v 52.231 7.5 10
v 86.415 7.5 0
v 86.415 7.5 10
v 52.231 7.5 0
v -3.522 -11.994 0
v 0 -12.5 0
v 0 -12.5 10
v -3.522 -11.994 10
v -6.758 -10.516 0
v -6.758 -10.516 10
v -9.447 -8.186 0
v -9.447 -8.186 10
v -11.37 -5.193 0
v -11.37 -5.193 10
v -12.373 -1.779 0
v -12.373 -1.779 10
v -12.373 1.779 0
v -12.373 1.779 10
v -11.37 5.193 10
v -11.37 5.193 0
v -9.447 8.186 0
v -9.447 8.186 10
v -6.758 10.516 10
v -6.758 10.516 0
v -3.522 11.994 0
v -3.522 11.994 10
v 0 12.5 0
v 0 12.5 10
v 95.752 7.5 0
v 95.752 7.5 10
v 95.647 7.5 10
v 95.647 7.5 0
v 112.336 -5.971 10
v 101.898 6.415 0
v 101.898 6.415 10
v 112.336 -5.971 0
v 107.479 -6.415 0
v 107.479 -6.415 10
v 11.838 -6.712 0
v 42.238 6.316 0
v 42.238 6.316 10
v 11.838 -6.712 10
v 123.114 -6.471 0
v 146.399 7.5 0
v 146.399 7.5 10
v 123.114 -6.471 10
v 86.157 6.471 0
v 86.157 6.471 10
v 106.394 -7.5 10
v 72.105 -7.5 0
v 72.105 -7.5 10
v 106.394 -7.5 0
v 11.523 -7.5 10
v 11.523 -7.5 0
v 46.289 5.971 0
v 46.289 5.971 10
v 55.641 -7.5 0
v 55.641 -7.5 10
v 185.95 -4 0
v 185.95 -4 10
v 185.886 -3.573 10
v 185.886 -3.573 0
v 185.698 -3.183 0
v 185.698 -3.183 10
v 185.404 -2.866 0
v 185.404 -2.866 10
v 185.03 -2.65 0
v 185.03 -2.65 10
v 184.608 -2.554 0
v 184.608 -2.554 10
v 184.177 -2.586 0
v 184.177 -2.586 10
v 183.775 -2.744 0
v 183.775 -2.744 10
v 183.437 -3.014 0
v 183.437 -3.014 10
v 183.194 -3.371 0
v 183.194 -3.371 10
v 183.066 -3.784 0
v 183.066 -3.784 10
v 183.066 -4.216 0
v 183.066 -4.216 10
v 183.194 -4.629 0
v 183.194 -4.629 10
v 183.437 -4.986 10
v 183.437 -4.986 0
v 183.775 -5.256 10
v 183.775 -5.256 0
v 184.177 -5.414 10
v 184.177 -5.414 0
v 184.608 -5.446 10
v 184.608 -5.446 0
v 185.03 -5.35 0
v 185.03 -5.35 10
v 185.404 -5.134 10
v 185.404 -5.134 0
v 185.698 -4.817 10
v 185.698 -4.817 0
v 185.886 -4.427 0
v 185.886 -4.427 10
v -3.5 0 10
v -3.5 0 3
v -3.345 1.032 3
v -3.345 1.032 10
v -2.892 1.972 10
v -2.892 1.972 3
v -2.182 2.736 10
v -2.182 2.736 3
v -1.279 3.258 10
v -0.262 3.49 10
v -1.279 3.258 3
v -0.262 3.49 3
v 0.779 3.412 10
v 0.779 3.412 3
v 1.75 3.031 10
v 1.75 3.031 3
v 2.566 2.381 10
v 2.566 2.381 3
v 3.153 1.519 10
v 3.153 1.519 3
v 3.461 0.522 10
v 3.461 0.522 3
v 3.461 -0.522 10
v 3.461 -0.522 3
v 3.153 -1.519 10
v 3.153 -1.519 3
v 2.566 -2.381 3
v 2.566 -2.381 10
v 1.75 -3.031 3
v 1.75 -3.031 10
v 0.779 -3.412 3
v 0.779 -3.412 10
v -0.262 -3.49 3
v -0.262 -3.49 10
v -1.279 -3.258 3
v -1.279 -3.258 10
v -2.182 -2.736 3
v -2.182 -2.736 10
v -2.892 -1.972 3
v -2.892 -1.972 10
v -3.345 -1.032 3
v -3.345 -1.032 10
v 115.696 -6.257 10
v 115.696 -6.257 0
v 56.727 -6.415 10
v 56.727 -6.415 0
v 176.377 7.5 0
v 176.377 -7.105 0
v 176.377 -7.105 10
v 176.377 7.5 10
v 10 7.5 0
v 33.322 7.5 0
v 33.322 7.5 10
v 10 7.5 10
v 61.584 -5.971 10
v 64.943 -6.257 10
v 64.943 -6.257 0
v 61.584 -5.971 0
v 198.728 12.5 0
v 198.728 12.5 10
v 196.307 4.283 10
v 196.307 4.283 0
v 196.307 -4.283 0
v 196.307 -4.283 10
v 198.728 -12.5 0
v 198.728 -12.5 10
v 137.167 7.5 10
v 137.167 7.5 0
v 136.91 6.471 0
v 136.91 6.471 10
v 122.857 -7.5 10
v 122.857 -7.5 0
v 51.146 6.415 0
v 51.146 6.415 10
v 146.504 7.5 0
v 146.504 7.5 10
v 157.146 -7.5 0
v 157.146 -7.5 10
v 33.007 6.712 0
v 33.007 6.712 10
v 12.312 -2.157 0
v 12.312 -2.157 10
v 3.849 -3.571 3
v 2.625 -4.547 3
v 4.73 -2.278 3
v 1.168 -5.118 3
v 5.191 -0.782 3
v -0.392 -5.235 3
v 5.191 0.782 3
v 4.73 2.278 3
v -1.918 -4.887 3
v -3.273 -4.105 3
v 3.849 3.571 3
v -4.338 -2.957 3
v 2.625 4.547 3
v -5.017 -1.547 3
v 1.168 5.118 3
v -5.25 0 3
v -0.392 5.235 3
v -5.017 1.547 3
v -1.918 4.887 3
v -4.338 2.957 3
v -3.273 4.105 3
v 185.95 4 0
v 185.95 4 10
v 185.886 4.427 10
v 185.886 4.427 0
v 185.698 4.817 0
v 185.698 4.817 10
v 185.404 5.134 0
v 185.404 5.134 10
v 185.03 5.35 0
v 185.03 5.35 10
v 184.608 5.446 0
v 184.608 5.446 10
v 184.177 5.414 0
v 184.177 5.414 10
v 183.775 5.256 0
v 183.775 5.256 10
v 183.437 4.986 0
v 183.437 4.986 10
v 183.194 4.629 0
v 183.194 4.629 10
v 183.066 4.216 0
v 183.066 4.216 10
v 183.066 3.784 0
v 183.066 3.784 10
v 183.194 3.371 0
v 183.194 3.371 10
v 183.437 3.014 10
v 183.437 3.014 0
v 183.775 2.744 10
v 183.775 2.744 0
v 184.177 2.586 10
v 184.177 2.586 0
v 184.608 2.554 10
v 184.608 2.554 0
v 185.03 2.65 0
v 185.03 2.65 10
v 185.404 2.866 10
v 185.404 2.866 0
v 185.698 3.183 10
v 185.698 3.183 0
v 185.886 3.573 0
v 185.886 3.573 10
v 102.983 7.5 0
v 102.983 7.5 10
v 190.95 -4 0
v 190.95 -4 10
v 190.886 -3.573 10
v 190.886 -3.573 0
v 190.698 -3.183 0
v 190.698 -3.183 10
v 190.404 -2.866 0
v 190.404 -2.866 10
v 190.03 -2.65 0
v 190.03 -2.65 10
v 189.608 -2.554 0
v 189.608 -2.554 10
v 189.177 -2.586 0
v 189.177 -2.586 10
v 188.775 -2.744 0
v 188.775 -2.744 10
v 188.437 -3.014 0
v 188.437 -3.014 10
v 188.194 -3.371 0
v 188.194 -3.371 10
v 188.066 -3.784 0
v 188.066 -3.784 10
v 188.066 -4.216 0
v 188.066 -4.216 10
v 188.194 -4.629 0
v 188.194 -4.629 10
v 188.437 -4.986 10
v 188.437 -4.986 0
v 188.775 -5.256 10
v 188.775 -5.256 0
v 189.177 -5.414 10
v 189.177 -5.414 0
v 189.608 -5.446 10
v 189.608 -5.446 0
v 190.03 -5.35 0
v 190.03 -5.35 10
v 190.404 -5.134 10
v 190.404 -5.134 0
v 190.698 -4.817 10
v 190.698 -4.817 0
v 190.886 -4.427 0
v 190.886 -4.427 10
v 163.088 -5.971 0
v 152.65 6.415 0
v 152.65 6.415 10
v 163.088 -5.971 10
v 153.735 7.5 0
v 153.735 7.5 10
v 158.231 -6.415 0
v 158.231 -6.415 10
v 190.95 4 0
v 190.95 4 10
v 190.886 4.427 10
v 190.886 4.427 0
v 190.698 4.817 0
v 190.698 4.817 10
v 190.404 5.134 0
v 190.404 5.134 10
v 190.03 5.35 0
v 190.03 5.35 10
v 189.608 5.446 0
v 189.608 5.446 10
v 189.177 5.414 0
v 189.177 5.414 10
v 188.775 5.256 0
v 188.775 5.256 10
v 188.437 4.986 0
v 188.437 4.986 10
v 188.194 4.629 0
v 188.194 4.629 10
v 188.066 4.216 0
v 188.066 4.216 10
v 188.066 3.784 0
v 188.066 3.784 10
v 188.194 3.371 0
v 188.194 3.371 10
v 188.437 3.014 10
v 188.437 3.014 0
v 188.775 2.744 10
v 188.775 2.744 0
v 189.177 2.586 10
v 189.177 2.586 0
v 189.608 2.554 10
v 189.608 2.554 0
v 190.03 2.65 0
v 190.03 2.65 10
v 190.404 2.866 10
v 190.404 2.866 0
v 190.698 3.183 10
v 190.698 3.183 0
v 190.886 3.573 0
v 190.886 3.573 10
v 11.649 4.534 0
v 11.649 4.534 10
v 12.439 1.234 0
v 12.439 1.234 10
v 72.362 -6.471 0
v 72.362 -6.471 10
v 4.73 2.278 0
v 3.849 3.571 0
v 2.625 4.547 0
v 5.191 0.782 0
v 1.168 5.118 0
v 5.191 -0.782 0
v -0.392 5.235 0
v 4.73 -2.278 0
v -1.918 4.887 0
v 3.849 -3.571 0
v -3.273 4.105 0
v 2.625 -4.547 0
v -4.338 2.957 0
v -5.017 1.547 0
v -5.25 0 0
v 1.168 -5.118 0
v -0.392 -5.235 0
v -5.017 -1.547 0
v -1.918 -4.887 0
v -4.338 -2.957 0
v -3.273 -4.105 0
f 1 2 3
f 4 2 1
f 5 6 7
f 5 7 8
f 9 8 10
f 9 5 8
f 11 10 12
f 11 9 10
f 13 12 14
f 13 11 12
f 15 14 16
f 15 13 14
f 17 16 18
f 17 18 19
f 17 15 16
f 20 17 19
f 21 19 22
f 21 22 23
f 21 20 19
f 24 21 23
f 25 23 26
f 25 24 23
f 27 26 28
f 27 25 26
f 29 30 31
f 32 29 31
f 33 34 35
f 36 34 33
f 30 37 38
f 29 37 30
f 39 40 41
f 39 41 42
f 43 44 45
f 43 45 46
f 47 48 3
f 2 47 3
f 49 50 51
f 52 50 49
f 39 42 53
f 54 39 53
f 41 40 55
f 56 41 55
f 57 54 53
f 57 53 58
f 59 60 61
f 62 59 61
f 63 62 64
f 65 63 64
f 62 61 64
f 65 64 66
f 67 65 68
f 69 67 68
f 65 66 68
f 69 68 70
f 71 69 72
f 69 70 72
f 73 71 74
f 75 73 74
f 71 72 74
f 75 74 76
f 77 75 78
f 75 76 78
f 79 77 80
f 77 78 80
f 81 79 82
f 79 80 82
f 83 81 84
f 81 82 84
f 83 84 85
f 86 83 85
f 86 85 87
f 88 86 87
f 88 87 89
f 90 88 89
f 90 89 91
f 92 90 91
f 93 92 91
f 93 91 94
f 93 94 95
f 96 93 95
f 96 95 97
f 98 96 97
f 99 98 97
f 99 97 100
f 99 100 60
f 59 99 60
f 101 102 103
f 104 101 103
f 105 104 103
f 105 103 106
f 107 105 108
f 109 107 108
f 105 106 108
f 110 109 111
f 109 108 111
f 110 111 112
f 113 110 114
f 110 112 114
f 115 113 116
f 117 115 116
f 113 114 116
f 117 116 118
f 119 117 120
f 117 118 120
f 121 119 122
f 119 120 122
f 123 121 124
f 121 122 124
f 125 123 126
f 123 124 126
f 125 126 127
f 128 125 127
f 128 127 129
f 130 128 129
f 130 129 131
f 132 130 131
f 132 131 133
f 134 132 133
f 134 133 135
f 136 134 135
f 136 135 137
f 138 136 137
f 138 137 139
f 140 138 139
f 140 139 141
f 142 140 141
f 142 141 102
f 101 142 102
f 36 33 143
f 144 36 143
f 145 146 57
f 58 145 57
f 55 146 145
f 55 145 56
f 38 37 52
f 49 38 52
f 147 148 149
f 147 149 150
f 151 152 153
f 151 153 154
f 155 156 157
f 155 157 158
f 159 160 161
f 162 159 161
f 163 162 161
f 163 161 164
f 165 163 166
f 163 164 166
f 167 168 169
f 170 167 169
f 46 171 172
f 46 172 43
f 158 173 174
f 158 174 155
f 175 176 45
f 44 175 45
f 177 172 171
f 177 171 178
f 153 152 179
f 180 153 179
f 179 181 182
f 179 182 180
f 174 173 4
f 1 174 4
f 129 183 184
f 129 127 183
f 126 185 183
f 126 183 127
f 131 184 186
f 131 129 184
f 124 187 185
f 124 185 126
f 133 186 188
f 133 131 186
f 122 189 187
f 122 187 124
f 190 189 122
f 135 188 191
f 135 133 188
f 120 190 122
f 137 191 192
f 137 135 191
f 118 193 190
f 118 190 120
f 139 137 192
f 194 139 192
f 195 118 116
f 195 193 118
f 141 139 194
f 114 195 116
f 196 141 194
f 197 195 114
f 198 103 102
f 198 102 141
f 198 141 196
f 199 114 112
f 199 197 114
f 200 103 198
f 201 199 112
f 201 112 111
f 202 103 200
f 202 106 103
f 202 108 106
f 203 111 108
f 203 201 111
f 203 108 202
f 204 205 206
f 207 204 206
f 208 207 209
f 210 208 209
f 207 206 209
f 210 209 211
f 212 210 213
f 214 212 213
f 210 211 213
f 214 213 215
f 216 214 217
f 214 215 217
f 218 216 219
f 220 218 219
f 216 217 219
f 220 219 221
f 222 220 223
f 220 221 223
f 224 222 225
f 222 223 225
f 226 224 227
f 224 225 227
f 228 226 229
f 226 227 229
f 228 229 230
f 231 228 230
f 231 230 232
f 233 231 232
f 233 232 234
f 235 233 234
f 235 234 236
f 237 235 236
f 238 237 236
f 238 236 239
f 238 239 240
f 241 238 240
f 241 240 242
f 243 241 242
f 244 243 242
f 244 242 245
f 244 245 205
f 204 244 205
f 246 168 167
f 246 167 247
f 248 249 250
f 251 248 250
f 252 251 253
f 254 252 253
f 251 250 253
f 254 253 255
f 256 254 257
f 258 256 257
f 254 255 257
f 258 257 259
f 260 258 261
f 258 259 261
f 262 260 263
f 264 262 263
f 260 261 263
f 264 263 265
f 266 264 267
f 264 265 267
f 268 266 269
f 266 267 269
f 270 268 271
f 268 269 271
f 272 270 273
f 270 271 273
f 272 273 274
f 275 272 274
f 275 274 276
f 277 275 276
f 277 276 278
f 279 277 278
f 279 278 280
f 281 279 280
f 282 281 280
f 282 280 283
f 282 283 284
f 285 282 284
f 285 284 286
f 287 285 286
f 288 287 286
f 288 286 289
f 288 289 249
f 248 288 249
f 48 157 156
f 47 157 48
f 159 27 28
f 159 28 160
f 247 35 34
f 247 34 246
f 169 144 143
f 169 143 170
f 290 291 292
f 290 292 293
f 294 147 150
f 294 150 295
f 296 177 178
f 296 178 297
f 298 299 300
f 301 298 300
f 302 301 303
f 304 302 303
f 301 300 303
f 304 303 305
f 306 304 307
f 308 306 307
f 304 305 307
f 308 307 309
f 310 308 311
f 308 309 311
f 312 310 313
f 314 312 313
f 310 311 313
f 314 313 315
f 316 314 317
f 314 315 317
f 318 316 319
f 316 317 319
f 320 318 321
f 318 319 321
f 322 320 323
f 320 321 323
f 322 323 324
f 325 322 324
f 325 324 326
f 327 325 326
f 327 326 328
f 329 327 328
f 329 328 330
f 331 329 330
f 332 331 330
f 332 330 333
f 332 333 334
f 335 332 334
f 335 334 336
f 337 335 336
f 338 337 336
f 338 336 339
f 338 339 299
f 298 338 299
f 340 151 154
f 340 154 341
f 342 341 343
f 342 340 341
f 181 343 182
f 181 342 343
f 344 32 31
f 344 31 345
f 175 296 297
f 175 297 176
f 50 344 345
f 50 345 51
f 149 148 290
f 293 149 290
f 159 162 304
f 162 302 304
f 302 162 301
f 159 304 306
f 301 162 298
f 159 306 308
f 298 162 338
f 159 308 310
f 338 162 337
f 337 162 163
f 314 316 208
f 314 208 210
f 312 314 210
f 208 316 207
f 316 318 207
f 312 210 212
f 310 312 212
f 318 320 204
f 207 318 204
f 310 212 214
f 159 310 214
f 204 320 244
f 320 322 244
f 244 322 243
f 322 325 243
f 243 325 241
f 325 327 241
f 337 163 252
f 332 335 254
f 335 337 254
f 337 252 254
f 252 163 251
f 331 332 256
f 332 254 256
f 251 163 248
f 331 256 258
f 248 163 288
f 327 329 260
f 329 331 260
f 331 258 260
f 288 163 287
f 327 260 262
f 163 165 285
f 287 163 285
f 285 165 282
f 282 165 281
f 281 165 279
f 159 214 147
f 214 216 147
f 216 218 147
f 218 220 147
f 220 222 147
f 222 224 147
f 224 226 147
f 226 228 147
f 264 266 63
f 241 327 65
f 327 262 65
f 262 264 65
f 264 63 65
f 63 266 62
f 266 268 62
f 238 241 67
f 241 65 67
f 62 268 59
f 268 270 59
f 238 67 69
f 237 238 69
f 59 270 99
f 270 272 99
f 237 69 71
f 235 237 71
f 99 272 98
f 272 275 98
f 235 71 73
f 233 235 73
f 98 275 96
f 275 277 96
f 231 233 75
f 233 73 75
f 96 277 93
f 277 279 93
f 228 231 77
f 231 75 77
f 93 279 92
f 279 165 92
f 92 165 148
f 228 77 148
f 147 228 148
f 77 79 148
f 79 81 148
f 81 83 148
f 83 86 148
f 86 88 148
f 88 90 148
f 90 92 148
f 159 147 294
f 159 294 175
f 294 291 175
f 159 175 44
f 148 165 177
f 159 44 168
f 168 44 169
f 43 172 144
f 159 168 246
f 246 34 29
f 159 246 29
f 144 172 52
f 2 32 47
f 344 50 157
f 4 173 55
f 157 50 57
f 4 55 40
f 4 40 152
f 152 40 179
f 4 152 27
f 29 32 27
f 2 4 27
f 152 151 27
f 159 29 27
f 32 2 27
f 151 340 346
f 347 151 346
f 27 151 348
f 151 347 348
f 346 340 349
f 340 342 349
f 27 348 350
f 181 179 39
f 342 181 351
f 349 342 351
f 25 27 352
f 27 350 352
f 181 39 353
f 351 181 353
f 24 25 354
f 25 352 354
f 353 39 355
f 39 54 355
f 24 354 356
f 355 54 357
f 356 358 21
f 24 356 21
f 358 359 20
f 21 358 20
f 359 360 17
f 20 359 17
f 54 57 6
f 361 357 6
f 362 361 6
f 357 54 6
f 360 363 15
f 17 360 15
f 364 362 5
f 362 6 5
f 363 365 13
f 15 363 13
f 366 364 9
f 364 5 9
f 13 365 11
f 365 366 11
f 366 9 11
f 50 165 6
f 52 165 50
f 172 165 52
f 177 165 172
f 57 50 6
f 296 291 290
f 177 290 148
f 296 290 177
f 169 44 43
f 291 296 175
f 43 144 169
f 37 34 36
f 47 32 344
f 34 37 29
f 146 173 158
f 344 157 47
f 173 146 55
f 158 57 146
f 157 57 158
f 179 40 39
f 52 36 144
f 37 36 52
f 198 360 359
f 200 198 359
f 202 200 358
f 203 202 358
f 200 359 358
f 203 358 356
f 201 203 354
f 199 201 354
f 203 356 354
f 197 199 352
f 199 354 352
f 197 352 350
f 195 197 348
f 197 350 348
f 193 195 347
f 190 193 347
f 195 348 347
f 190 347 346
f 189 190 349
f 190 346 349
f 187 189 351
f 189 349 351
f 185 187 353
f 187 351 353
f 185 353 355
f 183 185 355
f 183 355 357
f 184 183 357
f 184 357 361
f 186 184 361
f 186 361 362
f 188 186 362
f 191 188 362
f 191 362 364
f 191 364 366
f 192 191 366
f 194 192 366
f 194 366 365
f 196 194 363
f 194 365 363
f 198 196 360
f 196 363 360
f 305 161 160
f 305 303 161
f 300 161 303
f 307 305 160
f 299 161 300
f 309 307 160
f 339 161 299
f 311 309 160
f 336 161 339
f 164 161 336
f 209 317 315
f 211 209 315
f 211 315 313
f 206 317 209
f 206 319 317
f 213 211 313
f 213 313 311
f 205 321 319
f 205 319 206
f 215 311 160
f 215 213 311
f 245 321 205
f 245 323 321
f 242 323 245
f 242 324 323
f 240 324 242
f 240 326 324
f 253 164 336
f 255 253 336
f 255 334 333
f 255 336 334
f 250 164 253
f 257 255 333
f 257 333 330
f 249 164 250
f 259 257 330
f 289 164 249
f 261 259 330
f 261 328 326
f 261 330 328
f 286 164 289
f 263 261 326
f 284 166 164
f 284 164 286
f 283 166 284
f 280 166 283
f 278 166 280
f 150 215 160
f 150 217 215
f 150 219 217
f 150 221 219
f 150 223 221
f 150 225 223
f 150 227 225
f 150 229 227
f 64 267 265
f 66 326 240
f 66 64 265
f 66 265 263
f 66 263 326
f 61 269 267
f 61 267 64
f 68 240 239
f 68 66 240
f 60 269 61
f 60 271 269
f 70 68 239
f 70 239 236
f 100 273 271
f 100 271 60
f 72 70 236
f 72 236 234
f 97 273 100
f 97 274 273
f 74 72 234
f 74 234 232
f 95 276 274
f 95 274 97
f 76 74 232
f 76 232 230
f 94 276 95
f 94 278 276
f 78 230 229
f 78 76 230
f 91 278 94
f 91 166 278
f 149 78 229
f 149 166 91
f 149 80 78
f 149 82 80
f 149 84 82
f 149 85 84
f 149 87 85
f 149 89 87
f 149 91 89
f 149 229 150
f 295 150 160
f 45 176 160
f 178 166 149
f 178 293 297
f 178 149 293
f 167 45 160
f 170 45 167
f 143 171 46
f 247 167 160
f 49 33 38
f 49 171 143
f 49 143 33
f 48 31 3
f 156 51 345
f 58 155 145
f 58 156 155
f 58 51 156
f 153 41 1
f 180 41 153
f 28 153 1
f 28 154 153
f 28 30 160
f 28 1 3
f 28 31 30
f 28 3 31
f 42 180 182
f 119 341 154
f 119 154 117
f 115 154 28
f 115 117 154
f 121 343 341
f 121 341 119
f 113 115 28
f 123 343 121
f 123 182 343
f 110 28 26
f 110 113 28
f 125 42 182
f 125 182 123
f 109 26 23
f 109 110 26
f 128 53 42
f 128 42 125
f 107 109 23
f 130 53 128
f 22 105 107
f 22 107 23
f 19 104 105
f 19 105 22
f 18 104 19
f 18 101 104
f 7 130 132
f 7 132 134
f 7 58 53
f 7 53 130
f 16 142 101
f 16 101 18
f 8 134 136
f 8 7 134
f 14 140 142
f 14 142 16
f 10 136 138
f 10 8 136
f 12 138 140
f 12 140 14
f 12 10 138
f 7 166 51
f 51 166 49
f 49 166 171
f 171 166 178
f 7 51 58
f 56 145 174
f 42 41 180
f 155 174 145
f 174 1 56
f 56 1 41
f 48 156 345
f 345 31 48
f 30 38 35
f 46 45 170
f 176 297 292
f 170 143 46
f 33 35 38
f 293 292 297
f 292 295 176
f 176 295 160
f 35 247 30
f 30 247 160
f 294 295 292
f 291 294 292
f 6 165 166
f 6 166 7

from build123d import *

# Parameters (mm, degrees)
EXTRUDE_1_DEPTH          = 10
CUT_EXTRUDE_1_DEPTH      = 252.652538235
CUT_EXTRUDE_1_DEPTH_BACK = 252.652538235
SKETCH_7_R               = 3.5
CUT_EXTRUDE_5_DEPTH      = 252.652538235
SKETCH_8_R               = 5
CUT_EXTRUDE_6_DEPTH      = 3
SKETCH_9_R               = 3
CUT_EXTRUDE_7_DEPTH      = 252.652538235
CUT_EXTRUDE_START        = -10
SKETCH_11_R              = 27
CUT_EXTRUDE_9_DEPTH      = 10
SKETCH_12_R              = 30
CUT_EXTRUDE_10_DEPTH     = 10
SKETCH_14_R              = 1.45
CUT_EXTRUDE_12_DEPTH     = 300
CHAMFER_1_SIZE           = 16.633608268
CHAMFER_1_SIZE_2         = 2
CHAMFER_1_SIZE_3         = 1.419352868
CHAMFER_1_SIZE_4         = 1.457737974
CHAMFER_1_SIZE_5         = 2.415237377
CHAMFER_1_SIZE_6         = 1.523154621
CHAMFER_1_SIZE_7         = 3.004873211
SKETCH_15_R              = 5.25
SKETCH_15_R_2            = 3.5
CUT_EXTRUDE_13_DEPTH     = 3


with BuildPart() as part:
    # 草图1 → 凸台-拉伸1 (new body)
    with BuildSketch(Plane.XY):
        with BuildLine():
            Line((0, 12.5), (199.067804112, 12.5))
            ThreePointArc((199.067804112, 12.5), (250, 0), (199.067804112, -12.5))
            Line((199.067804112, -12.5), (0, -12.5))
            ThreePointArc((0, -12.5), (-12.5, 0), (0, 12.5))
        make_face()
    extrude(amount=EXTRUDE_1_DEPTH)

    # 草图3 → 切除-拉伸1 (cut, two sides: drawn at the far end of the back side and taken through both)
    with BuildSketch(Plane.XY.offset(10).offset(-CUT_EXTRUDE_1_DEPTH_BACK)):
        Polygon((176.376805713, 7.5), (151.73545401, 7.5), (164.376805713, -7.5), (176.376805713, -7.5), align=None)
        Polygon((159.145761472, -7.5), (146.504409769, 7.5), (146.399203355, 7.5), (121.399203355, -7.5), align=None)
        Polygon((113.624600829, -7.5), (138.624600829, 7.5), (100.983249125, 7.5), align=None)
        Polygon((70.646998471, -7.5), (108.393556588, -7.5), (95.752204884, 7.5), (95.646998471, 7.5), align=None)
        Polygon((50.231044241, 7.5), (62.872395944, -7.5), (87.872395944, 7.5), align=None)
        Polygon((10, -7.5), (57.641351703, -7.5), (45, 7.5), align=None)
        with BuildLine():
            Line((34.845635859, 7.5), (10, 7.5))
            ThreePointArc((10, 7.5), (12.156331085, 2.910947362), (12.312475569, -2.157068696))
            Line((12.312475569, -2.157068696), (34.845635859, 7.5))
        make_face()
    extrude(amount=CUT_EXTRUDE_1_DEPTH + CUT_EXTRUDE_1_DEPTH_BACK, mode=Mode.SUBTRACT)

    # 草图7 → 切除-拉伸5 (cut, through all)
    with BuildSketch(Plane(origin=(0, 0, 0), x_dir=(-1, 0, 0), z_dir=(0, 0, -1))):
        Circle(SKETCH_7_R)
    extrude(amount=-CUT_EXTRUDE_5_DEPTH, mode=Mode.SUBTRACT)

    # 草图8 → 切除-拉伸6 (cut)
    with BuildSketch(Plane(origin=(0, 0, 0), x_dir=(-1, 0, 0), z_dir=(0, 0, -1))):
        with Locations((-223, 0)):
            Circle(SKETCH_8_R)
    extrude(amount=-CUT_EXTRUDE_6_DEPTH, mode=Mode.SUBTRACT)

    # 草图9 → 切除-拉伸7 (cut, through all)
    with BuildSketch(Plane(origin=(0, 0, 0), x_dir=(-1, 0, 0), z_dir=(0, 0, -1))):
        with Locations((-223, 0)):
            Circle(SKETCH_9_R)
    extrude(amount=-CUT_EXTRUDE_7_DEPTH, mode=Mode.SUBTRACT)

    # 草图11 → 切除-拉伸9 (cut)
    with BuildSketch(Plane.XY.offset(10).offset(CUT_EXTRUDE_START)):
        with Locations((223, 0)):
            Circle(SKETCH_11_R)
    extrude(amount=CUT_EXTRUDE_9_DEPTH, mode=Mode.SUBTRACT)

    # 草图12 → 切除-拉伸10 (cut)
    with BuildSketch(Plane.XY.offset(10)):
        with Locations((226, 0)):
            Circle(SKETCH_12_R)
    extrude(amount=-CUT_EXTRUDE_10_DEPTH, mode=Mode.SUBTRACT)

    # 草图14 → 切除-拉伸12 (cut)
    with BuildSketch(Plane.XY.offset(10)):
        with Locations((184.5, 4)):
            Circle(SKETCH_14_R)
        with Locations((189.5, 4)):
            Circle(SKETCH_14_R)
        with Locations((189.5, -4)):
            Circle(SKETCH_14_R)
        with Locations((184.5, -4)):
            Circle(SKETCH_14_R)
    extrude(amount=-CUT_EXTRUDE_12_DEPTH, mode=Mode.SUBTRACT)

    # 倒角1
    # the kernel refuses this chamfer: 16.633608268, 3.004873211, 2.415237377, 2, 1.523154621, 1.457737974, 1.419352868 mm, written as the material it adds along each edge
    with BuildSketch(Plane(origin=(164.376805713, -7.5, 0), x_dir=(0.9999946519205123, -0.0032704939035876055, 0), z_dir=(0, 0, 1))) as chamfer_1_piece_1:
        Polygon((CHAMFER_1_SIZE * 0.999994651904, CHAMFER_1_SIZE * 0.00327049390353), (-CHAMFER_1_SIZE_2 * 0.646924574173, CHAMFER_1_SIZE_2 * 0.762553995026), (0, 0), align=None)
    extrude(amount=10)
    with BuildSketch(Plane(origin=(151.73545401, 7.5, 0), x_dir=(0.9996219169112968, 0.027495876610586605, 0), z_dir=(0, 0, 1))) as chamfer_1_piece_2:
        Polygon((CHAMFER_1_SIZE_2 * 0.999621916911, -CHAMFER_1_SIZE_2 * 0.0274958766106), (CHAMFER_1_SIZE_3 * 0.623158385834, -CHAMFER_1_SIZE_3 * 0.782095662754), (0, 0), align=None)
    extrude(amount=10)
    with BuildSketch(Plane(origin=(159.145761472, -7.5, 10), x_dir=(-0.9996219169112968, -0.02749587661058747, 0), z_dir=(0, 0, -1))) as chamfer_1_piece_3:
        Polygon((CHAMFER_1_SIZE_2 * 0.999621916911, CHAMFER_1_SIZE_2 * 0.0274958766106), (CHAMFER_1_SIZE_3 * 0.623158385834, CHAMFER_1_SIZE_3 * 0.782095662754), (0, 0), align=None)
    extrude(amount=10)
    with BuildSketch(Plane(origin=(121.399203355, -7.5, 10), x_dir=(0.9985473741645164, -0.05388080872768336, 0), z_dir=(0, 0, -1))) as chamfer_1_piece_4:
        Polygon((CHAMFER_1_SIZE_4 * 0.998547373967, -CHAMFER_1_SIZE_4 * 0.053880808717), (CHAMFER_1_SIZE_2 * 0.828525861946, -CHAMFER_1_SIZE_2 * 0.559950797917), (0, 0), align=None)
    extrude(amount=10)
    with BuildSketch(Plane(origin=(113.624600829, -7.5, 10), x_dir=(-0.6693179531686358, 0.7429760948820275, 0), z_dir=(0, 0, -1))) as chamfer_1_piece_5:
        Polygon((CHAMFER_1_SIZE_2 * 0.999455005814, CHAMFER_1_SIZE_2 * 0.033010473375), (-CHAMFER_1_SIZE_5 * 0.191677362679, CHAMFER_1_SIZE_5 * 0.981457991195), (0, 0), align=None)
    extrude(amount=10)
    with BuildSketch(Plane(origin=(138.624600829, 7.5, 0), x_dir=(-0.9985473741645164, 0.05388080872768389, 0), z_dir=(0, 0, 1))) as chamfer_1_piece_6:
        Polygon((CHAMFER_1_SIZE_4 * 0.998547373967, CHAMFER_1_SIZE_4 * 0.053880808717), (CHAMFER_1_SIZE_2 * 0.828525861946, CHAMFER_1_SIZE_2 * 0.559950797917), (0, 0), align=None)
    extrude(amount=10)
    with BuildSketch(Plane(origin=(100.983249125, 7.5, 10), x_dir=(0.6007510451121151, -0.7994361649291964, 0), z_dir=(0, 0, -1))) as chamfer_1_piece_7:
        Polygon((CHAMFER_1_SIZE_3 * 0.998441703797, -CHAMFER_1_SIZE_3 * 0.0558046920381), (CHAMFER_1_SIZE_2 * 0.600751045112, -CHAMFER_1_SIZE_2 * 0.799436164929), (0, 0), align=None)
    extrude(amount=10)
    with BuildSketch(Plane(origin=(70.646998471, -7.5, 0), x_dir=(0.8430222103307435, 0.537878752963033, 0), z_dir=(0, 0, 1))) as chamfer_1_piece_8:
        Polygon((CHAMFER_1_SIZE_2 * 0.999621916911, -CHAMFER_1_SIZE_2 * 0.0274958766106), (CHAMFER_1_SIZE_4 * 0.843022210164, -CHAMFER_1_SIZE_4 * 0.537878752857), (0, 0), align=None)
    extrude(amount=10)
    with BuildSketch(Plane(origin=(108.393556588, -7.5, 0), x_dir=(-0.6007510451121131, 0.799436164929198, 0), z_dir=(0, 0, 1)), Plane(origin=(50.231044241, 7.5, 0), x_dir=(0.6007510451121165, -0.7994361649291954, 0), z_dir=(0, 0, 1)), Plane(origin=(57.641351703, -7.5, 0), x_dir=(-0.6007510451121163, 0.7994361649291957, 0), z_dir=(0, 0, 1))) as chamfer_1_piece_9:
        Polygon((CHAMFER_1_SIZE_3 * 0.998441703797, CHAMFER_1_SIZE_3 * 0.0558046920381), (CHAMFER_1_SIZE_2 * 0.600751045112, CHAMFER_1_SIZE_2 * 0.799436164929), (0, 0), align=None)
    extrude(amount=10)
    with BuildSketch(Plane(origin=(87.872395944, 7.5, 10), x_dir=(-0.8430222103307434, -0.5378787529630333, 0), z_dir=(0, 0, -1))) as chamfer_1_piece_10:
        Polygon((CHAMFER_1_SIZE_2 * 0.999621916911, CHAMFER_1_SIZE_2 * 0.0274958766106), (CHAMFER_1_SIZE_4 * 0.843022210164, CHAMFER_1_SIZE_4 * 0.537878752857), (0, 0), align=None)
    extrude(amount=10)
    with BuildSketch(Plane(origin=(62.872395944, -7.5, 10), x_dir=(0.8689411613860879, 0.4949154049420938, 0), z_dir=(0, 0, -1))) as chamfer_1_piece_11:
        Polygon((CHAMFER_1_SIZE_5 * 0.99974277381, -CHAMFER_1_SIZE_5 * 0.0226800806836), (-CHAMFER_1_SIZE_2 * 0.18152448307, -CHAMFER_1_SIZE_2 * 0.983386425596), (0, 0), align=None)
    extrude(amount=10)
    with BuildSketch(Plane(origin=(10, -7.5, 10), x_dir=(0.9079663603978809, 0.419043062686671, 0), z_dir=(0, 0, -1))) as chamfer_1_piece_12:
        Polygon((CHAMFER_1_SIZE_2 * 0.999621916911, CHAMFER_1_SIZE_2 * 0.0274958766106), (CHAMFER_1_SIZE_6 * 0.907966360501, CHAMFER_1_SIZE_6 * 0.419043062734), (0, 0), align=None)
    extrude(amount=10)
    with BuildSketch(Plane(origin=(45, 7.5, 10), x_dir=(-0.9261548899255846, -0.3771433677886015, 0), z_dir=(0, 0, -1))) as chamfer_1_piece_13:
        Polygon((CHAMFER_1_SIZE_7 * 0.999834715095, -CHAMFER_1_SIZE_7 * 0.0181808325096), (-CHAMFER_1_SIZE_2 * 0.308450800004, -CHAMFER_1_SIZE_2 * 0.951240297705), (0, 0), align=None)
    extrude(amount=10)
    with BuildSketch(Plane(origin=(34.845635859, 7.5, 0), x_dir=(-0.9987654472434115, 0.0496747560906775, 0), z_dir=(0, 0, 1))) as chamfer_1_piece_14:
        Polygon((CHAMFER_1_SIZE_6 * 0.998765447357, CHAMFER_1_SIZE_6 * 0.0496747560963), (CHAMFER_1_SIZE_2 * 0.898442451911, CHAMFER_1_SIZE_2 * 0.439091289601), (0, 0), align=None)
    extrude(amount=10)

    # 草图15 → 切除-拉伸13 (cut)
    with BuildSketch(Plane(origin=(0, 0, 0), x_dir=(-1, 0, 0), z_dir=(0, 0, -1))):
        Circle(SKETCH_15_R)
        Circle(SKETCH_15_R_2, mode=Mode.SUBTRACT)
    extrude(amount=-CUT_EXTRUDE_13_DEPTH, mode=Mode.SUBTRACT)


solid = part.part
